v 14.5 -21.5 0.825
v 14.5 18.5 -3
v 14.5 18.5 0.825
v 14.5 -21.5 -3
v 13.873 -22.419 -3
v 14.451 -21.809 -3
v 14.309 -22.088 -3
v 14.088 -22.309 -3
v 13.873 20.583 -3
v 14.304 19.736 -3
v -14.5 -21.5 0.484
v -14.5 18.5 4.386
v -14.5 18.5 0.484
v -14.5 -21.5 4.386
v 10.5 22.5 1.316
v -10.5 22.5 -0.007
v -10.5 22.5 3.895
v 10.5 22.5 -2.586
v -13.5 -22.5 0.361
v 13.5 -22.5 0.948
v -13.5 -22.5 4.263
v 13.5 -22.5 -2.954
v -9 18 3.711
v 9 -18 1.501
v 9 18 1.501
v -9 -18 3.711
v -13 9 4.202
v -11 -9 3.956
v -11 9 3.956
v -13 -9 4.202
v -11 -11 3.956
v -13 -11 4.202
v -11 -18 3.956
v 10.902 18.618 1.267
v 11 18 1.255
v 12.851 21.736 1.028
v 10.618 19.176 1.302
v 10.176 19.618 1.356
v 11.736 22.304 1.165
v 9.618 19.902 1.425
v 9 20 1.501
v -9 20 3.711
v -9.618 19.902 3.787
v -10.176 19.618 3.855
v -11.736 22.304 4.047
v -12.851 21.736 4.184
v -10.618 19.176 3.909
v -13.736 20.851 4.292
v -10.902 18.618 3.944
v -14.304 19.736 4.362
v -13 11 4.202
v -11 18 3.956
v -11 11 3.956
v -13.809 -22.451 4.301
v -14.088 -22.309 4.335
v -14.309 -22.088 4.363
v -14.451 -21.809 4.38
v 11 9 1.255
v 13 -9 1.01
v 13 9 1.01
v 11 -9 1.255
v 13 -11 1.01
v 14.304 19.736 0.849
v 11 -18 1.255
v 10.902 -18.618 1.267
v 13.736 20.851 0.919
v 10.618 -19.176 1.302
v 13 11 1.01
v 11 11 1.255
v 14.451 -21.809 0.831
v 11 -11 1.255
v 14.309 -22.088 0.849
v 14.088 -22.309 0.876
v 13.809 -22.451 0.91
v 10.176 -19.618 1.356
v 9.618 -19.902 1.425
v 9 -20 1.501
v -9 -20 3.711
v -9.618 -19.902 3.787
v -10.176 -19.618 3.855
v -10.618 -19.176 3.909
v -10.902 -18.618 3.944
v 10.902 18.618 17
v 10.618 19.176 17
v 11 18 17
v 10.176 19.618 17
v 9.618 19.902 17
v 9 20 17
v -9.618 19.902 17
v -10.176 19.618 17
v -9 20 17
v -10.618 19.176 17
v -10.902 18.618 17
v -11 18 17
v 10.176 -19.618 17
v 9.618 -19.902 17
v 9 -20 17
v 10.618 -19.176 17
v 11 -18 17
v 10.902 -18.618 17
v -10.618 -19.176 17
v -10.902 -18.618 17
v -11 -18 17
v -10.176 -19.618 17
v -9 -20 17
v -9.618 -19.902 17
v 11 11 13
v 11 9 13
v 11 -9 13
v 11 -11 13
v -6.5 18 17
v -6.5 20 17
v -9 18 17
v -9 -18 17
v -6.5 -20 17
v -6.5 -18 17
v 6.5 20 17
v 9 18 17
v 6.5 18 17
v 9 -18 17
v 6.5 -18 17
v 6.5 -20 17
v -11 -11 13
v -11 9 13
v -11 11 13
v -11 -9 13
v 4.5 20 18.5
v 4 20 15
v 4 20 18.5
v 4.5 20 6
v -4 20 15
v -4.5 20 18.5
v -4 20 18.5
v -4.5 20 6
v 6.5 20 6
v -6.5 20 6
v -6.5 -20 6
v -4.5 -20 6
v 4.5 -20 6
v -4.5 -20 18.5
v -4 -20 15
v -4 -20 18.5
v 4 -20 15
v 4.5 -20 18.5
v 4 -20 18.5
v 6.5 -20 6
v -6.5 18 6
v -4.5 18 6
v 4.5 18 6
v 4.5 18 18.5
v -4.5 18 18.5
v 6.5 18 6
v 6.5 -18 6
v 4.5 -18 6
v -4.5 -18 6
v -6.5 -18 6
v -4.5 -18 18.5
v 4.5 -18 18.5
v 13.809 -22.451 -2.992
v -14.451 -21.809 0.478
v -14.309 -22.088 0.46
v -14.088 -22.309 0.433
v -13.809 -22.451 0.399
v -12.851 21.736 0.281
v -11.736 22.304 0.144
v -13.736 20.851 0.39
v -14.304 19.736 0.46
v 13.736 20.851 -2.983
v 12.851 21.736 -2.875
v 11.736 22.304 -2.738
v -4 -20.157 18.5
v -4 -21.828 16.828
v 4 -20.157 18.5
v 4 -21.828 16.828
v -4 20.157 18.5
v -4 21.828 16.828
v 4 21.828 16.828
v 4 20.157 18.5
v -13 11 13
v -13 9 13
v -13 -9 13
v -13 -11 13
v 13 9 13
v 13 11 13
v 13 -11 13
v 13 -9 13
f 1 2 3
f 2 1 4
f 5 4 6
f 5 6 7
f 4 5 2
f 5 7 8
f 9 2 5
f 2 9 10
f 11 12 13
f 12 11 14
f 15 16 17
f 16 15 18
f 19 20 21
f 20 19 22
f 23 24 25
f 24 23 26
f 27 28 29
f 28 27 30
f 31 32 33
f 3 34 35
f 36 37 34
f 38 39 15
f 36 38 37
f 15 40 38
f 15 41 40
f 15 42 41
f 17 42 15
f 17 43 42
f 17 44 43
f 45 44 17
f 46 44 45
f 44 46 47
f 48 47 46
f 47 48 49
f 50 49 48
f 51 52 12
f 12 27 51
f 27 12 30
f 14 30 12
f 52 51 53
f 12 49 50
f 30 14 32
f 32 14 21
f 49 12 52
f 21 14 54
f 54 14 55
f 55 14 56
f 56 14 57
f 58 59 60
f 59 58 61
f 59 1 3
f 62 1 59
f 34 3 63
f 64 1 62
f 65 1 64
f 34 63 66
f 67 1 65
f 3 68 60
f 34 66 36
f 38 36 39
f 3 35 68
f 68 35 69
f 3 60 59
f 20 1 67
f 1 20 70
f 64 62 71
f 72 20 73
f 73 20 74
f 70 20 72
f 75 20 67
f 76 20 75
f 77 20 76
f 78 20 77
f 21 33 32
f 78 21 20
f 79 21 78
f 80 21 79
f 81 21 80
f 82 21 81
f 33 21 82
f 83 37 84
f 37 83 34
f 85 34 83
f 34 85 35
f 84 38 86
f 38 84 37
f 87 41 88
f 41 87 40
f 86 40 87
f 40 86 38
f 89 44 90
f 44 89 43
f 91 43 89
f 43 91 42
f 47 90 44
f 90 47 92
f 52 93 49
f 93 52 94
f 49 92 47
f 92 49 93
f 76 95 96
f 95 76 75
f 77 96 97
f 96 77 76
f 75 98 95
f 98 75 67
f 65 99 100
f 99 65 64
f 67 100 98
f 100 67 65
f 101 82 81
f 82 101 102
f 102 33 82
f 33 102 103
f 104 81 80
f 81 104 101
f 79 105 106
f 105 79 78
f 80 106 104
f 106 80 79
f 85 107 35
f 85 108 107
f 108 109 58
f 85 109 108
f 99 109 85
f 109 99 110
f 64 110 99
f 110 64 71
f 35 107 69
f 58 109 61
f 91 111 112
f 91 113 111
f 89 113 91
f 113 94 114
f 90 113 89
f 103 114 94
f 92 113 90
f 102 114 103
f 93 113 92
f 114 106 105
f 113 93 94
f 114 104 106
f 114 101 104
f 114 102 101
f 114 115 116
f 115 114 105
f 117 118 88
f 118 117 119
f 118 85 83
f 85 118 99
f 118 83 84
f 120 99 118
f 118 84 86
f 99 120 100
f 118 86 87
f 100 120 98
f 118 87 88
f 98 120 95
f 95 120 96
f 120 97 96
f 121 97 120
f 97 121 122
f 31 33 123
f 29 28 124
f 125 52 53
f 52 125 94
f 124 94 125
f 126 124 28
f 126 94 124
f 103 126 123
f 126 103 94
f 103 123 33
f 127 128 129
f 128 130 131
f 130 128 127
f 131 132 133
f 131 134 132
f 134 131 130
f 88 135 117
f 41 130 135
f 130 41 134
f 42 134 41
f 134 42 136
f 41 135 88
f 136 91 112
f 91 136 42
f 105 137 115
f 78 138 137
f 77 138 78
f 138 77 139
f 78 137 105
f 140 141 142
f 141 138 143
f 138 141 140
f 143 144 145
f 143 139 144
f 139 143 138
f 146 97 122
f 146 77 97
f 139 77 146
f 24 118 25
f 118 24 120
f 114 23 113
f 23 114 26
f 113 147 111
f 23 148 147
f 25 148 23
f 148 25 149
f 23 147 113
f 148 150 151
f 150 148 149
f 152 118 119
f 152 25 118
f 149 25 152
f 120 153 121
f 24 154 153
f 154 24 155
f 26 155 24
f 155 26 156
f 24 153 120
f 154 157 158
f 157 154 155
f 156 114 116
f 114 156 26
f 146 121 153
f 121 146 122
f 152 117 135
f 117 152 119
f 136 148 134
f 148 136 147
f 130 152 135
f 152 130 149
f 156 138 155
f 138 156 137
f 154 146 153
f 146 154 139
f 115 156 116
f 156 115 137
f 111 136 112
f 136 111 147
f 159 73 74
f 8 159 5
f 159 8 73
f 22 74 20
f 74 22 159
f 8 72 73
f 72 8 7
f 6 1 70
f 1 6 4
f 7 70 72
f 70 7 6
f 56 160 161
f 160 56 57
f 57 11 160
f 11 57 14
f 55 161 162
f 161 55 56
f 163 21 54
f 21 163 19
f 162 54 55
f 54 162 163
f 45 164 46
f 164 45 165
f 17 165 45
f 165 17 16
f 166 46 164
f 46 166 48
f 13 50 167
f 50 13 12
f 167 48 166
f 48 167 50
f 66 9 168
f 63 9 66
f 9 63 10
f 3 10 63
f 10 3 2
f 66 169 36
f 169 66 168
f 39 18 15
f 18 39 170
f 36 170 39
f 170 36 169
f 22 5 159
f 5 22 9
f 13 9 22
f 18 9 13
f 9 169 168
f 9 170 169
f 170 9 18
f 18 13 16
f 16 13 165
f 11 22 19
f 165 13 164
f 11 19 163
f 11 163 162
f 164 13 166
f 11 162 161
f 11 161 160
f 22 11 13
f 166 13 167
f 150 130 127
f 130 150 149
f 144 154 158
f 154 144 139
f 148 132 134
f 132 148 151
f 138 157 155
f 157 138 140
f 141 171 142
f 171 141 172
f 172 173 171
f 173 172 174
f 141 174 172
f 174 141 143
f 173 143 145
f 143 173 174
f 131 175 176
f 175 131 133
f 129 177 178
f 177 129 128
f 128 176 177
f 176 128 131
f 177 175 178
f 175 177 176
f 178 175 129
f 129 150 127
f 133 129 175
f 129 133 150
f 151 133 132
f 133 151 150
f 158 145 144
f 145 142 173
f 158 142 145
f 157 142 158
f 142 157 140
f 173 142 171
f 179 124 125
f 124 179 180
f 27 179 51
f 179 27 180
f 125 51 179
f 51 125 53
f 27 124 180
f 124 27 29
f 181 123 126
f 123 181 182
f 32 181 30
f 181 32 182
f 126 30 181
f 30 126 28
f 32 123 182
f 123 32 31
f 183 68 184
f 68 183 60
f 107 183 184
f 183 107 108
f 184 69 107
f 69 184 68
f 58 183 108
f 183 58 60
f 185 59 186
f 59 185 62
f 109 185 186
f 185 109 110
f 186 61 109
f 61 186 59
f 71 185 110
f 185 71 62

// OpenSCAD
/*
translate([-10,-17.5,-1.5]) cube([20,35,3]);
translate([-1.5,-17.5,1.5]) cube([3,10,2]);
translate([-2.5,-17.5,3.5]) cube([5,10,1]);
translate([-5,5,1.5]) cube([1,5,2]);
*/

x = 29; // 29.4
y = 45; //45.5
z = 3;
a = 7;

left = true;

right_r = 1;
left_r = 4;

difference() {
	union() {
		difference()	{
			translate([-x/2,-y/2,-z]) cube([x,y,z*3]);
			translate([-(x+10)/2,-(y+10)/2,5]) rotate([0,a,0]) cube([x+10,y+10,z+10]);
//			translate([-16.99,-2.5,-7]) cube([8,5,30]);
		}
		difference() {
			translate([-11,-20,-1]) cube([22,40,18]);
			translate([-9,-18,-1]) cube([18,36,19]);
			translate([11,20,-1]) rotate([0,0,0]) rounding(19,2);
			translate([-11,20,-1]) rotate([0,0,90]) rounding(19,2);
			translate([11,-20,-1]) rotate([0,0,270]) rounding(19,2);
			translate([-11,-20,-1]) rotate([0,0,180]) rounding(19,2);
     		translate([-(x-16)/2,-(y-4)/2,6]) cube([x-16,y-4,22]);
//			translate([-16.99,-2.5,-7]) cube([8,5,30]);
		}


	}

	translate([-(x+10)/2,-(y+10)/2,-12]) rotate([0,a,0]) cube([x+10,y+10,z+10]);
    // RIGHT
	translate([x/2,-y/2,-5]) rotate([0,0,270]) rounding(10,right_r);
	translate([-x/2,-y/2,-5]) rotate([0,0,180]) rounding(10,right_r);
    // LEFT
	translate([-x/2,y/2,-5]) rotate([0,0,90]) rounding(10,left_r);
	translate([x/2,y/2,-5]) rotate([0,0,0]) rounding(10,left_r);
}
difference() {
	union() {
		translate([-(x-20)/2,-(y-5)/2,-z/2+1]) cube([x-20,y-5,22]);
		translate([-4,-19,14]) rotate([45,0,0]) cube([8,4,4]);
		translate([-4,19,14]) rotate([45,0,0]) cube([8,4,4]);
	}
	translate([-(x-18)/2,-(y-9)/2,-z/2+1]) cube([x-18,y-9,23]);
	translate([-x/2,-y/2,18.5]) cube([x,y,10]);
}

translate([-13,9,1]) cube([2,2,12]);
translate([-13,-11,1]) cube([2,2,12]);
translate([11,9,-2]) cube([2,2,15]);
translate([11,-11,-2]) cube([2,2,15]);

//#translate([-1,-22,1]) cube([2,2,15]);

module rounding(length, radius)
{
		
        translate([-radius,-radius,0]) difference()
        {
                cube([radius*2,radius*2,length]);
                translate([0,0,-1]) cylinder(length+2,radius,radius,$fn=20);
        }       
}
